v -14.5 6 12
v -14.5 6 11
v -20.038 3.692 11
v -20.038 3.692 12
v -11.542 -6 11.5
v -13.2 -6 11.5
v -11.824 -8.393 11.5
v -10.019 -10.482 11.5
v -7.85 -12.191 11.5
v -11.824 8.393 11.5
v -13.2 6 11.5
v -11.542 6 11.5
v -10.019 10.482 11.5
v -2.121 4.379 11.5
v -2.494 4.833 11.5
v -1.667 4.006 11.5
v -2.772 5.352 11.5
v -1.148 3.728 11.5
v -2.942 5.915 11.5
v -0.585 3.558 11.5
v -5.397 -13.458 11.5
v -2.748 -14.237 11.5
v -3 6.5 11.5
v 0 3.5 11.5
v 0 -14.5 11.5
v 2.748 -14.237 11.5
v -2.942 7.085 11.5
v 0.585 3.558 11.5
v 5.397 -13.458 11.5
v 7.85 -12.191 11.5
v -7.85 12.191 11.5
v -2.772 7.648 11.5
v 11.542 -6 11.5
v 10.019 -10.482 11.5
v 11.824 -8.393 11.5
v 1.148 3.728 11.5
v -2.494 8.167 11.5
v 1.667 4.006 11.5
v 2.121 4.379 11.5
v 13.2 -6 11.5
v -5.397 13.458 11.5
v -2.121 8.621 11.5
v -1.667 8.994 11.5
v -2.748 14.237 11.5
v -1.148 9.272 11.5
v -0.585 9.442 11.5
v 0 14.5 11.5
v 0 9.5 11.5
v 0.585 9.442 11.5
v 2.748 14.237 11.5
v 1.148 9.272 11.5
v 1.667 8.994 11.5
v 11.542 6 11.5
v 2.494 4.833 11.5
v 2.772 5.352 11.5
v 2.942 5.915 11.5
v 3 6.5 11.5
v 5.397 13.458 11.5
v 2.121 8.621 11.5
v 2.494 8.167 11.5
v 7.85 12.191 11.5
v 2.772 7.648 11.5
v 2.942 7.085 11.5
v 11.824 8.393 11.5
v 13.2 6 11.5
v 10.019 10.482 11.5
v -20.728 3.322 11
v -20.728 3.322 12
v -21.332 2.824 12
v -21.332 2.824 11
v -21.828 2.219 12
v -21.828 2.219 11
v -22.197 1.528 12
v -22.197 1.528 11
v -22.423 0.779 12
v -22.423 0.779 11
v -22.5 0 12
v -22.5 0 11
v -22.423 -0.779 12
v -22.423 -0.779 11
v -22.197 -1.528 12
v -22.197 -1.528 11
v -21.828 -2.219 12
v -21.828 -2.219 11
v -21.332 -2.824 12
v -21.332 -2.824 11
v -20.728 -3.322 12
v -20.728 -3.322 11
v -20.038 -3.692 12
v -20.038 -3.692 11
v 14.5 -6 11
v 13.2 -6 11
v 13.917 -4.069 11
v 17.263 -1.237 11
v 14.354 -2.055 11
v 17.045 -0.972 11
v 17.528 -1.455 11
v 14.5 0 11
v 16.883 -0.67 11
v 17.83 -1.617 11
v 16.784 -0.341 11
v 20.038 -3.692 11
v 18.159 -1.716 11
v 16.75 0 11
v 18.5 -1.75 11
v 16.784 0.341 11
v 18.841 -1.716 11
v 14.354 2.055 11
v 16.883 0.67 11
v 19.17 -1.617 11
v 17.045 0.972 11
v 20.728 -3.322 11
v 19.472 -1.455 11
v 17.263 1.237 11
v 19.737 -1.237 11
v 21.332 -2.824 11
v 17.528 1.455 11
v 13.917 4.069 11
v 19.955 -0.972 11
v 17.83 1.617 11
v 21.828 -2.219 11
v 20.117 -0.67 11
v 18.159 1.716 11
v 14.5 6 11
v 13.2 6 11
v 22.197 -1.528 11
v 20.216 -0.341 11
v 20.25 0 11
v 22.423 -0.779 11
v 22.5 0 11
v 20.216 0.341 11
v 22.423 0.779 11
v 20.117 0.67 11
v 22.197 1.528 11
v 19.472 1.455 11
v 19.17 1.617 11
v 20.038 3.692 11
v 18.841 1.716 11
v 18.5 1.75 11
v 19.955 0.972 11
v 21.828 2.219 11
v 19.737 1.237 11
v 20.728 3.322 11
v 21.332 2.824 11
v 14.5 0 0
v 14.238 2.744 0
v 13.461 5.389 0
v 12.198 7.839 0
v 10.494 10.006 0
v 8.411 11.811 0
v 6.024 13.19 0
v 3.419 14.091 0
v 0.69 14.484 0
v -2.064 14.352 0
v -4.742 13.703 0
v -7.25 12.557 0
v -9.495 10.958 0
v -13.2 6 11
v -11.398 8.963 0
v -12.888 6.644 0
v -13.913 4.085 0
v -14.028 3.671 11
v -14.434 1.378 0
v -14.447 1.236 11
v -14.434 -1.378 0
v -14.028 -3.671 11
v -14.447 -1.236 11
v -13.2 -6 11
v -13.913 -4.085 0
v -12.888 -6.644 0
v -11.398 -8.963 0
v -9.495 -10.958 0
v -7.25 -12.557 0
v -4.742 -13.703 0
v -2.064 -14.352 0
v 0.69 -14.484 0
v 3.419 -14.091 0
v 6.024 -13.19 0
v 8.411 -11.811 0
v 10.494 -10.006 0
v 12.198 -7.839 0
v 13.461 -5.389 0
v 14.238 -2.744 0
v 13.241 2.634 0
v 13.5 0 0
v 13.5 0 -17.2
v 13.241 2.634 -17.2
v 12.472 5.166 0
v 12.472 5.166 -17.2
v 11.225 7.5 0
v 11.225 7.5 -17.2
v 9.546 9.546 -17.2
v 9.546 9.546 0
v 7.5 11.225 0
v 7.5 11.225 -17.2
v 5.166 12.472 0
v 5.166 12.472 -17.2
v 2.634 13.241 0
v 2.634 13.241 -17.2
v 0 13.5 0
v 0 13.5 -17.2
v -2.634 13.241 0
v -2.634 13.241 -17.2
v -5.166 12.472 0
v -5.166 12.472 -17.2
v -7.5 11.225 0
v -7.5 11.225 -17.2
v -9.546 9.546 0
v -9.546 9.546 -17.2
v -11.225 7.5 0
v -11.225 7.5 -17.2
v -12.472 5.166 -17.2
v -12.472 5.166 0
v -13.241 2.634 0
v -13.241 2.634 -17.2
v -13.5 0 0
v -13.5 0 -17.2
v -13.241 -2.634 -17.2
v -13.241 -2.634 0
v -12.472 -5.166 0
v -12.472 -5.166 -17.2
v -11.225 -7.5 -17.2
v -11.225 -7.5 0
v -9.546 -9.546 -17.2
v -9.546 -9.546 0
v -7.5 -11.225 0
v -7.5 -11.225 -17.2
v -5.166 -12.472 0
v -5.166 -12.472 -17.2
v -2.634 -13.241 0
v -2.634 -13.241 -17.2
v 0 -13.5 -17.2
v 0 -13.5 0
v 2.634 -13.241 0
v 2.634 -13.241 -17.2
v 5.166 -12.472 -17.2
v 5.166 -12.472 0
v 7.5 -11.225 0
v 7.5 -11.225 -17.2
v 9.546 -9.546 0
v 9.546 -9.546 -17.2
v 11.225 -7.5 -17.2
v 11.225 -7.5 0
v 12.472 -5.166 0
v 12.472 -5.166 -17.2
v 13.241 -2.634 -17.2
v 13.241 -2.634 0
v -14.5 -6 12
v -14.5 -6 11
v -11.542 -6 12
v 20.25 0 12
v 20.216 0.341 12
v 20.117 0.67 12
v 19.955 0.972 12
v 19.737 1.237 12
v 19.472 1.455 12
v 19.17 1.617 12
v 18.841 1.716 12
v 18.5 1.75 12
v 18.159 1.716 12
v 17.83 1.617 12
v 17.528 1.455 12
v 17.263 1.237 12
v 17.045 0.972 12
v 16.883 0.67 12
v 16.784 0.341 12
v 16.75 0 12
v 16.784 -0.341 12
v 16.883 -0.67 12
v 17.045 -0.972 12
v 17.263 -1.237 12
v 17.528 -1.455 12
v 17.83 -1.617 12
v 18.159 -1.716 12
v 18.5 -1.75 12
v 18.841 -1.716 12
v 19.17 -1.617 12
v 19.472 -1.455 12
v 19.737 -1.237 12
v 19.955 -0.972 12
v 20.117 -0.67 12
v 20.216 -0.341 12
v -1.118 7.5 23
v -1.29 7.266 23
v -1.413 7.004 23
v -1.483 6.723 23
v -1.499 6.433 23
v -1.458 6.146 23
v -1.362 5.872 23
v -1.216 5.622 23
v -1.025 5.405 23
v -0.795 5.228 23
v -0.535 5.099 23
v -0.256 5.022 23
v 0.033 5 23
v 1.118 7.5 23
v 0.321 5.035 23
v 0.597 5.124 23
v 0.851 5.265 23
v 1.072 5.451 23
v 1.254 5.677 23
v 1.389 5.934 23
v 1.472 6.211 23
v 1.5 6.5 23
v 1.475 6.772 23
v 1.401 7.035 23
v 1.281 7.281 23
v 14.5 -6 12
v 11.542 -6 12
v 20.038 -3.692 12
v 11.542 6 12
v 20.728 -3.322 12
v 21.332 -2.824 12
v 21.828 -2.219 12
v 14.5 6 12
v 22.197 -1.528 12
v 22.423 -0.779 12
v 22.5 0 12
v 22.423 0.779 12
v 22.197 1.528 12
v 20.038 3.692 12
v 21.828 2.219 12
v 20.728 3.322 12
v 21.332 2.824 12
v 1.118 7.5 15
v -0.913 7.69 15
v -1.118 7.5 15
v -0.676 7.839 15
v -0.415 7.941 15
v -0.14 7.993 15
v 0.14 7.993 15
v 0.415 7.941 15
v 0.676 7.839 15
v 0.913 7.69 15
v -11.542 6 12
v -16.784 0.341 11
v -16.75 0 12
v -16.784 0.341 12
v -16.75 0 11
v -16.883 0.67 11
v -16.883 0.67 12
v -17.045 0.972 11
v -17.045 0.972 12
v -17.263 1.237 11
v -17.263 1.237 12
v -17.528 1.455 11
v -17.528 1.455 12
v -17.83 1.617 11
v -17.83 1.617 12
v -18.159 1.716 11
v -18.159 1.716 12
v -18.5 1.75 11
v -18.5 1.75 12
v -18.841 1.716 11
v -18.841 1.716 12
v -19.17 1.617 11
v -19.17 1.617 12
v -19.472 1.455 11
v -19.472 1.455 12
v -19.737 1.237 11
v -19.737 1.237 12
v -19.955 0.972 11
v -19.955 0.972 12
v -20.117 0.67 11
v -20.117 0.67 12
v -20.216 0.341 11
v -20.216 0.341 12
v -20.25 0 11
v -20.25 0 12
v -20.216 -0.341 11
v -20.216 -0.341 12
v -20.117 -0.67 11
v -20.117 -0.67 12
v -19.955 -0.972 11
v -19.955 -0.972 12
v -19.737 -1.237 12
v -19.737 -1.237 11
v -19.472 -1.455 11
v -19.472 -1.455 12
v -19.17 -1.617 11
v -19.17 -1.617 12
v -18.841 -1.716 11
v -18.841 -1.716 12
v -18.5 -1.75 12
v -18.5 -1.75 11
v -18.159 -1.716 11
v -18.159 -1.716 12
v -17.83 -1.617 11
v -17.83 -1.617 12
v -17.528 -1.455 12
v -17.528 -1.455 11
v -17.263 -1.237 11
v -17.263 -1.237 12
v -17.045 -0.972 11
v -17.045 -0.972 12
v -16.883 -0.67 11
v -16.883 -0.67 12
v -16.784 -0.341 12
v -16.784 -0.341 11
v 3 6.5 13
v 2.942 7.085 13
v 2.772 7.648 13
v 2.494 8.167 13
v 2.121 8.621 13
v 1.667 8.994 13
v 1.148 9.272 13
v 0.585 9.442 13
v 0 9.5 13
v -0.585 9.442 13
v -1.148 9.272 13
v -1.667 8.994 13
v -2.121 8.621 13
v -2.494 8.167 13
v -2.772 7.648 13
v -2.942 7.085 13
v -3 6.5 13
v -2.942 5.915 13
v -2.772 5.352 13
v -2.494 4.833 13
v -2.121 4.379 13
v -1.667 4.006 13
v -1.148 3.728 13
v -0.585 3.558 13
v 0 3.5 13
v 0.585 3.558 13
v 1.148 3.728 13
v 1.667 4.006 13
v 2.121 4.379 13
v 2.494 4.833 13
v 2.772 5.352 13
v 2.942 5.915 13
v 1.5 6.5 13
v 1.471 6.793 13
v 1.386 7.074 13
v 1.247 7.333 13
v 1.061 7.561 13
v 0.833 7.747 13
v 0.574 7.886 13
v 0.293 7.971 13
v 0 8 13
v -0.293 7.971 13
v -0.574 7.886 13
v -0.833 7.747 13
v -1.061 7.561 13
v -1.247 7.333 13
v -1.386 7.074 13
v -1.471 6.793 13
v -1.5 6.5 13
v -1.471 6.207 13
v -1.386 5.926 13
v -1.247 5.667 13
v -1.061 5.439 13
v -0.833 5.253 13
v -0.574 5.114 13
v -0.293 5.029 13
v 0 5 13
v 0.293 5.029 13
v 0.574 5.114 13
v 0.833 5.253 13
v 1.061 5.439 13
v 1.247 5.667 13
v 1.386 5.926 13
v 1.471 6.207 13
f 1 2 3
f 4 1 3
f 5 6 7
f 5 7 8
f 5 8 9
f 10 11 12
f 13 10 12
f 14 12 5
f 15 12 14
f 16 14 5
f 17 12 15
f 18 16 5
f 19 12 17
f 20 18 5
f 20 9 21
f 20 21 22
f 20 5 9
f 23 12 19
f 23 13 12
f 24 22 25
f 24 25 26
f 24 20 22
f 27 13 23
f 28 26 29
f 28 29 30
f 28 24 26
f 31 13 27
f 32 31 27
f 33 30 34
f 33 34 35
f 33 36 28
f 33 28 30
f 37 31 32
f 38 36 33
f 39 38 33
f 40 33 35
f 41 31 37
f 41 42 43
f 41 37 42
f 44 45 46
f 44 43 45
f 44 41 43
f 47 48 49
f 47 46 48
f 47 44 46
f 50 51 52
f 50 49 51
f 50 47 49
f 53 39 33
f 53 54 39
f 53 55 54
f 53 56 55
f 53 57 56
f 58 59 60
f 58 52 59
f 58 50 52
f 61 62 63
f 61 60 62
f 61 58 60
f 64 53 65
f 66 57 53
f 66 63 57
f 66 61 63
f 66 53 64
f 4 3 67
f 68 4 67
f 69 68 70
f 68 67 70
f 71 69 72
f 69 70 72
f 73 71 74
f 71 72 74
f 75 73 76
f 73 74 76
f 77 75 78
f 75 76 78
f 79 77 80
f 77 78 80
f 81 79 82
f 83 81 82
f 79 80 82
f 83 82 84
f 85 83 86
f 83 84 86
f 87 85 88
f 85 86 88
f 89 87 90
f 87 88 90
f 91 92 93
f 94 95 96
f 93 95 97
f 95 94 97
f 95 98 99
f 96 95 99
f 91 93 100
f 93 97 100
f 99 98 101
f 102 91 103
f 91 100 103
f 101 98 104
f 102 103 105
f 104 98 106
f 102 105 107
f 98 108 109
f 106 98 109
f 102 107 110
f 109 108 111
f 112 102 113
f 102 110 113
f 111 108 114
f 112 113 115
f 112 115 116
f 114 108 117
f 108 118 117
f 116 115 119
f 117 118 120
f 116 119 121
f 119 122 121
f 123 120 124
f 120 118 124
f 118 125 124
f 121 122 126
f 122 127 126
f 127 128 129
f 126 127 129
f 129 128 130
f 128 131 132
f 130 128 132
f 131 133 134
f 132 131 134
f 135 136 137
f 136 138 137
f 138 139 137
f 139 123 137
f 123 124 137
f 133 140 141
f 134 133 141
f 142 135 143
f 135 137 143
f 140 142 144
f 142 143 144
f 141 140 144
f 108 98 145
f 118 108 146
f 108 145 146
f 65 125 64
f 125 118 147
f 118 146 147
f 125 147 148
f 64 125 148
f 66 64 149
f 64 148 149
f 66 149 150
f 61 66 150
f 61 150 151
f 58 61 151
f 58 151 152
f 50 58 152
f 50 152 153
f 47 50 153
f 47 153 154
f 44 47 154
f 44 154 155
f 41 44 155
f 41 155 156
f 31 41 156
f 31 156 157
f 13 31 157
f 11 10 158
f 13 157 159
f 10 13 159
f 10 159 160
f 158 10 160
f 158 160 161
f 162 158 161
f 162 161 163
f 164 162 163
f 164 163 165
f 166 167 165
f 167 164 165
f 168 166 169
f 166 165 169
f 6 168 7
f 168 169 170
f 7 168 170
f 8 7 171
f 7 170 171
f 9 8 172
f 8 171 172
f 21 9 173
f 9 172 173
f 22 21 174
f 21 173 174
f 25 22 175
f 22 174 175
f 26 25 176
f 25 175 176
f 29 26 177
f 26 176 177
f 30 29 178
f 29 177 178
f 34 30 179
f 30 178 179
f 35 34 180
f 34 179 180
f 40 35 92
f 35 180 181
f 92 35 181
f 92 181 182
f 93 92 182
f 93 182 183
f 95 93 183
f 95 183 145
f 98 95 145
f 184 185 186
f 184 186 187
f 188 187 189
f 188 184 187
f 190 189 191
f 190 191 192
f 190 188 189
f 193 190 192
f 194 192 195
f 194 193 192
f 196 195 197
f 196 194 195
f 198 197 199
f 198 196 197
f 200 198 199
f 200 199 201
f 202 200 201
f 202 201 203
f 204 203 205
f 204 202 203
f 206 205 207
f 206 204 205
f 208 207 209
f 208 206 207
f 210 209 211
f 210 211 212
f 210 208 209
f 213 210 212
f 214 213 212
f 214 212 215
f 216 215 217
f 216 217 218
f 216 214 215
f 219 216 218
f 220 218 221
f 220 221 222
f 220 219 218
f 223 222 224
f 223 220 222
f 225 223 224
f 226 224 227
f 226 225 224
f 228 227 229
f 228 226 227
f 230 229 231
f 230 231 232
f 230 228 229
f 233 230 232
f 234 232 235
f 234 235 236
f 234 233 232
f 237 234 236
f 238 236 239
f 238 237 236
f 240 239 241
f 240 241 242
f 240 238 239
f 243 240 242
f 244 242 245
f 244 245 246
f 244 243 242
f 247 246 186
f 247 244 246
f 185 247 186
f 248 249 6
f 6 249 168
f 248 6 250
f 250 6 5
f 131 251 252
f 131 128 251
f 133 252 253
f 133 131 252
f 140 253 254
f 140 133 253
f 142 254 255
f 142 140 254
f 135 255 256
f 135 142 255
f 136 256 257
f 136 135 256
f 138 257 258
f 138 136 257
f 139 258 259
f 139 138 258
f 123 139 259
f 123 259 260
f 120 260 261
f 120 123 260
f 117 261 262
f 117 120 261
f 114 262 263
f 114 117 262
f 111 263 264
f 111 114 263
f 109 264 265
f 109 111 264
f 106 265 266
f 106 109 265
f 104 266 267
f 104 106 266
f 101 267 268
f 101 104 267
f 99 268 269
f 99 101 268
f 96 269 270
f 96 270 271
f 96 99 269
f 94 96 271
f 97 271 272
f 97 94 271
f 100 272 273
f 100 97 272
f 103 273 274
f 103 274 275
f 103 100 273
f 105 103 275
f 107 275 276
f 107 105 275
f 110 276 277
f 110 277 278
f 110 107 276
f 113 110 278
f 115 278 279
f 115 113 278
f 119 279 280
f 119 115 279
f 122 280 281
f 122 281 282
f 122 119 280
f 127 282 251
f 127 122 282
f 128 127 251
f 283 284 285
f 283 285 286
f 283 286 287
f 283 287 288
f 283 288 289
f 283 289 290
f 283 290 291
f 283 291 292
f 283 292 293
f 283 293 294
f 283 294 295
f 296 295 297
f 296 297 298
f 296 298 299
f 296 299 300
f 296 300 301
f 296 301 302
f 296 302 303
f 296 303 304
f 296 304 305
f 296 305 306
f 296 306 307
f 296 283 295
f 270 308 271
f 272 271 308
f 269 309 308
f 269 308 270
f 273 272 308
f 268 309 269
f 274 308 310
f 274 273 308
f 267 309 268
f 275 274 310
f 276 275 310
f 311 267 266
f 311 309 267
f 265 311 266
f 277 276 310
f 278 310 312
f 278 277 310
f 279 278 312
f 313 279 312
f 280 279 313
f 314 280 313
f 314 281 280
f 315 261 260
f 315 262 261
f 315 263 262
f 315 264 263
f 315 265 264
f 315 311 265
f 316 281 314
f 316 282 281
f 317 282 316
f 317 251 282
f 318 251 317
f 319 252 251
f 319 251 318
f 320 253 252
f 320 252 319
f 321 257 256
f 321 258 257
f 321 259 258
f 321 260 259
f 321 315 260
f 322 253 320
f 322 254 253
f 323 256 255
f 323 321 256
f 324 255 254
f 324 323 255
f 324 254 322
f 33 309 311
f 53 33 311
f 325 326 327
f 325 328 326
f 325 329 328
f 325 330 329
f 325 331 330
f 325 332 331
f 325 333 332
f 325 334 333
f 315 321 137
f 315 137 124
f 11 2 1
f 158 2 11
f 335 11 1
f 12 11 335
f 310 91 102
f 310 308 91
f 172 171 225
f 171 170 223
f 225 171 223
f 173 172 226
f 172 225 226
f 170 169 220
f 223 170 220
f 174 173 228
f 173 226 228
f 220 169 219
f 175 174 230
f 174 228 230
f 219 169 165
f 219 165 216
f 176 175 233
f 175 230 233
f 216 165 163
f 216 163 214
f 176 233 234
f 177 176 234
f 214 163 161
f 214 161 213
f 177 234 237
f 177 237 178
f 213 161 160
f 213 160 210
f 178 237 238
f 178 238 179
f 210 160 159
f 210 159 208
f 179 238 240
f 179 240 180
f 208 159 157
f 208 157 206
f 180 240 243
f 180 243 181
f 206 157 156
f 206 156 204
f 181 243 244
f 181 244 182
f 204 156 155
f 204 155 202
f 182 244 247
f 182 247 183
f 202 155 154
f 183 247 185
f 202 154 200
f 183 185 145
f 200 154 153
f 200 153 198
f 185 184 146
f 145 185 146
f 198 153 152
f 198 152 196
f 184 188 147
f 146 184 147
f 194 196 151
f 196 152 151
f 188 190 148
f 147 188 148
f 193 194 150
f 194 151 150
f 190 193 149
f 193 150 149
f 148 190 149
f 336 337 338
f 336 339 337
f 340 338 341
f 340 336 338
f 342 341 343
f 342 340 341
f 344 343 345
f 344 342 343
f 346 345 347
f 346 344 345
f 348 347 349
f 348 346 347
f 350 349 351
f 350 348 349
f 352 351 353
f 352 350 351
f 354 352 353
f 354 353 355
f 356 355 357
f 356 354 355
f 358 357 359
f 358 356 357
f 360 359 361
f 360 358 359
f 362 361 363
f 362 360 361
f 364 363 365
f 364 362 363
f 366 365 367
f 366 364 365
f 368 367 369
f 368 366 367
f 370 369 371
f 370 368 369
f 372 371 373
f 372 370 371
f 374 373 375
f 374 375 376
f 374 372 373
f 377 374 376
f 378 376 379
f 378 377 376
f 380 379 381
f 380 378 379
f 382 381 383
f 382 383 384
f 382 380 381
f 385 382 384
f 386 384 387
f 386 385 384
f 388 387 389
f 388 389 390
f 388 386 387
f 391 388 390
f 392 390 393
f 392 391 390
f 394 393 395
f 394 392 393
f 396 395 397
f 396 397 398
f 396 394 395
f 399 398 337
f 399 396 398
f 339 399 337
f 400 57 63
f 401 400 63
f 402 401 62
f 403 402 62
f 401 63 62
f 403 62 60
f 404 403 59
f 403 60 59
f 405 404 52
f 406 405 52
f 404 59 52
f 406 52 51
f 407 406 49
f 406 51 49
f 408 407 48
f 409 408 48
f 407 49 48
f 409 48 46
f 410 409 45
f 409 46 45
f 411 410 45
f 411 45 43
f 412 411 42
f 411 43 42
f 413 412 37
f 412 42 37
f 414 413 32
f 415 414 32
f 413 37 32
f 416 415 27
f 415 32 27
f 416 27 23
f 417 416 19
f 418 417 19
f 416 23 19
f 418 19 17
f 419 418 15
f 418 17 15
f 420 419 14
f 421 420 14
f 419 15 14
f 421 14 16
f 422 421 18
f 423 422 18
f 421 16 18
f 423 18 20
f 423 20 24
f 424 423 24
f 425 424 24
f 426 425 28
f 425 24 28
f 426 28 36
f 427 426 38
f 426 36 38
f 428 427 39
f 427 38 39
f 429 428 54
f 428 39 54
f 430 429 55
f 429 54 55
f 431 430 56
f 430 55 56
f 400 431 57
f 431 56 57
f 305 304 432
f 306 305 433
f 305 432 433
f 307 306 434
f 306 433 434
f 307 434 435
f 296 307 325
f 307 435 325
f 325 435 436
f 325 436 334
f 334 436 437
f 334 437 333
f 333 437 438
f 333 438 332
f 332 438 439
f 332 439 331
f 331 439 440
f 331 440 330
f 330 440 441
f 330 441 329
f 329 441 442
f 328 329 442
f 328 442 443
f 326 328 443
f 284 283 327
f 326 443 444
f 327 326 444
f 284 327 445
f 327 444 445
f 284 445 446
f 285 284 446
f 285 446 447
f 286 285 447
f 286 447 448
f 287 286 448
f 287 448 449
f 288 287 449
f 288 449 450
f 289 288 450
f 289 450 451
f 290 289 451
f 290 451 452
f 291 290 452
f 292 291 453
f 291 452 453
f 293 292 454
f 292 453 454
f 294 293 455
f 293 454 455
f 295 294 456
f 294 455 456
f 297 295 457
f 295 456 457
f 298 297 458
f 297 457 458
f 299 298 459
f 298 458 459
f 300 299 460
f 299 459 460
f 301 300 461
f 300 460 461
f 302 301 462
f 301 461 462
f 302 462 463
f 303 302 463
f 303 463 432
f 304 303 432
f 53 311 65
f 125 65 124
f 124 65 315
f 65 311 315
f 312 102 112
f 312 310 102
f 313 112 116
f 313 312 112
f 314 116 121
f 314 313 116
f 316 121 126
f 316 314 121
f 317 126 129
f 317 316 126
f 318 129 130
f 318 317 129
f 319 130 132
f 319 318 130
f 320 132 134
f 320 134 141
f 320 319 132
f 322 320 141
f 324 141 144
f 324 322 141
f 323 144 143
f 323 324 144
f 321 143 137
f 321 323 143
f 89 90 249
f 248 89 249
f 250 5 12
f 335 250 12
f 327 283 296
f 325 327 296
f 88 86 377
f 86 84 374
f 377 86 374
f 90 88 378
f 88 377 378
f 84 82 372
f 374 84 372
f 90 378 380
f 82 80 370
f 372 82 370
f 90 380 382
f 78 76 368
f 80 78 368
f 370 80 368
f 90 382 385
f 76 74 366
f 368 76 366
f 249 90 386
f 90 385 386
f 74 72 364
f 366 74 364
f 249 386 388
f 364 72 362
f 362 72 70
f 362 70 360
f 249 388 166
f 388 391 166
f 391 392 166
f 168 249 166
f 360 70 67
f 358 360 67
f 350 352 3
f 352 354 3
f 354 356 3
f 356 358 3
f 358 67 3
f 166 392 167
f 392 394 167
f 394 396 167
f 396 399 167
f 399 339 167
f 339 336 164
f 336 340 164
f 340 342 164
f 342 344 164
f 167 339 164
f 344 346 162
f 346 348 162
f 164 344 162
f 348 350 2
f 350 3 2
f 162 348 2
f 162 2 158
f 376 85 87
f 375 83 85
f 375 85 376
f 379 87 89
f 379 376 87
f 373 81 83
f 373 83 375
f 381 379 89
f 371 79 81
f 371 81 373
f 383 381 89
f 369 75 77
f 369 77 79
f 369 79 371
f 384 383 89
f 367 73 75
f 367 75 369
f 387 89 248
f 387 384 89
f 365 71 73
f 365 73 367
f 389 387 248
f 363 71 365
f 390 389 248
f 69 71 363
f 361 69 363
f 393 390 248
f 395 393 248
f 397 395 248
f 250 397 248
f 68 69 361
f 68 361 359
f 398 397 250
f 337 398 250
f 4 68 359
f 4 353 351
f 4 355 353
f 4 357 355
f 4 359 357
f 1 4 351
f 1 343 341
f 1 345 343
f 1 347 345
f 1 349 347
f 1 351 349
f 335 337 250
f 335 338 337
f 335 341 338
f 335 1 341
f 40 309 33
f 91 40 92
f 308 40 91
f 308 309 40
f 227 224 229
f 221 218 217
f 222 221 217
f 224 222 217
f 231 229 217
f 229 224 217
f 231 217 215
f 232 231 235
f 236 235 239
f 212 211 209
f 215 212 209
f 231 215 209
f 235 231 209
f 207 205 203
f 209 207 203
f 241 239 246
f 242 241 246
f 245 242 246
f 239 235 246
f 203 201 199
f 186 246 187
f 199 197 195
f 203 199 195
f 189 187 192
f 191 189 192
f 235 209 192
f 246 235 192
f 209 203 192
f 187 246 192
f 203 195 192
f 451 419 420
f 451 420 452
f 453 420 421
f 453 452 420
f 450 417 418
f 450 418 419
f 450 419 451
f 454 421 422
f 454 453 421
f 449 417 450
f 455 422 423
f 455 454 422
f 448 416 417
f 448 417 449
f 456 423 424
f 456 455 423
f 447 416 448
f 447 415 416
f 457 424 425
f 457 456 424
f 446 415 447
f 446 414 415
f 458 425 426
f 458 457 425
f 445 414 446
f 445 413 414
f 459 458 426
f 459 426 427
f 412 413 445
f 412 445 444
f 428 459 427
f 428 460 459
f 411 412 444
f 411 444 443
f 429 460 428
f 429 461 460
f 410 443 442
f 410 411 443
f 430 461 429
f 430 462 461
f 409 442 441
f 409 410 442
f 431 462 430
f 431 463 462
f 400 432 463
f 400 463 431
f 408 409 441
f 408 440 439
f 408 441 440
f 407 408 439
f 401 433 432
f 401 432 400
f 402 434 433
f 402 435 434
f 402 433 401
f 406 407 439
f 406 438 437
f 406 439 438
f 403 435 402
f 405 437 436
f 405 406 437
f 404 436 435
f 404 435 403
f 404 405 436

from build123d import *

# Parameters (mm, degrees)
F0_R      = 13.5
F1_DEPTH  = 17.2
F2_R      = 14.5
F3_DEPTH  = 11.5
F4_R      = 1.75
F4_W      = 2.95831
F4_H      = 12
F5_DEPTH  = 0.5
F6_R      = 3
F7_DEPTH  = 1.5
F8_R      = 1.5
F9_DEPTH  = 10
F10_W     = 2.236068
F10_H     = 1.743455
F11_DEPTH = 8


with BuildPart() as f1:
    # F0 (on Top) → F1 (new body)
    with BuildSketch(Plane.XY):
        Circle(F0_R)
    extrude(amount=-F1_DEPTH)

    # F2 (on face) → F3 (join)
    with BuildSketch(Plane.XY):
        Circle(F2_R)
    extrude(amount=F3_DEPTH)

    # F4 (on face) → F5 (join, symmetric)
    with BuildSketch(Plane.XY.offset(11.5)):
        with BuildLine():
            Line((-14.5, -6), (-14.5, 6))
            Line((-14.5, 6), (-20.038462, 3.692308))
            ThreePointArc((-20.038462, 3.692308), (-22.5, 0), (-20.038462, -3.692308))
            Line((-20.038462, -3.692308), (-14.5, -6))
        make_face()
        with Locations((-18.5, 0)):
            Circle(F4_R, mode=Mode.SUBTRACT)
        with Locations((-13.020845, 0)):
            Rectangle(F4_W, F4_H)
        with BuildLine():
            ThreePointArc((20.038462, -3.692308), (22.5, 0), (20.038462, 3.692308))
            Line((20.038462, 3.692308), (14.5, 6))
            Line((14.5, 6), (14.5, -6))
            Line((14.5, -6), (20.038462, -3.692308))
        make_face()
        with Locations((18.5, 0)):
            Circle(F4_R, mode=Mode.SUBTRACT)
        with Locations((13.020845, 0)):
            Rectangle(F4_W, F4_H)
    extrude(amount=F5_DEPTH, both=True)

    # F6 (on face) → F7 (join)
    with BuildSketch(Plane.XY.offset(11.5)):
        with Locations((0, 6.5)):
            Circle(F6_R)
    extrude(amount=F7_DEPTH)

    # F8 (on face) → F9 (join)
    with BuildSketch(Plane.XY.offset(13)):
        with Locations((0, 6.5)):
            Circle(F8_R)
    extrude(amount=F9_DEPTH)

    # F10 (on face) → F11 (cut)
    with BuildSketch(Plane.XY.offset(23)):
        with Locations((0, 8.371727)):
            Rectangle(F10_W, F10_H)
    extrude(amount=-F11_DEPTH, mode=Mode.SUBTRACT)


solid = f1.part
